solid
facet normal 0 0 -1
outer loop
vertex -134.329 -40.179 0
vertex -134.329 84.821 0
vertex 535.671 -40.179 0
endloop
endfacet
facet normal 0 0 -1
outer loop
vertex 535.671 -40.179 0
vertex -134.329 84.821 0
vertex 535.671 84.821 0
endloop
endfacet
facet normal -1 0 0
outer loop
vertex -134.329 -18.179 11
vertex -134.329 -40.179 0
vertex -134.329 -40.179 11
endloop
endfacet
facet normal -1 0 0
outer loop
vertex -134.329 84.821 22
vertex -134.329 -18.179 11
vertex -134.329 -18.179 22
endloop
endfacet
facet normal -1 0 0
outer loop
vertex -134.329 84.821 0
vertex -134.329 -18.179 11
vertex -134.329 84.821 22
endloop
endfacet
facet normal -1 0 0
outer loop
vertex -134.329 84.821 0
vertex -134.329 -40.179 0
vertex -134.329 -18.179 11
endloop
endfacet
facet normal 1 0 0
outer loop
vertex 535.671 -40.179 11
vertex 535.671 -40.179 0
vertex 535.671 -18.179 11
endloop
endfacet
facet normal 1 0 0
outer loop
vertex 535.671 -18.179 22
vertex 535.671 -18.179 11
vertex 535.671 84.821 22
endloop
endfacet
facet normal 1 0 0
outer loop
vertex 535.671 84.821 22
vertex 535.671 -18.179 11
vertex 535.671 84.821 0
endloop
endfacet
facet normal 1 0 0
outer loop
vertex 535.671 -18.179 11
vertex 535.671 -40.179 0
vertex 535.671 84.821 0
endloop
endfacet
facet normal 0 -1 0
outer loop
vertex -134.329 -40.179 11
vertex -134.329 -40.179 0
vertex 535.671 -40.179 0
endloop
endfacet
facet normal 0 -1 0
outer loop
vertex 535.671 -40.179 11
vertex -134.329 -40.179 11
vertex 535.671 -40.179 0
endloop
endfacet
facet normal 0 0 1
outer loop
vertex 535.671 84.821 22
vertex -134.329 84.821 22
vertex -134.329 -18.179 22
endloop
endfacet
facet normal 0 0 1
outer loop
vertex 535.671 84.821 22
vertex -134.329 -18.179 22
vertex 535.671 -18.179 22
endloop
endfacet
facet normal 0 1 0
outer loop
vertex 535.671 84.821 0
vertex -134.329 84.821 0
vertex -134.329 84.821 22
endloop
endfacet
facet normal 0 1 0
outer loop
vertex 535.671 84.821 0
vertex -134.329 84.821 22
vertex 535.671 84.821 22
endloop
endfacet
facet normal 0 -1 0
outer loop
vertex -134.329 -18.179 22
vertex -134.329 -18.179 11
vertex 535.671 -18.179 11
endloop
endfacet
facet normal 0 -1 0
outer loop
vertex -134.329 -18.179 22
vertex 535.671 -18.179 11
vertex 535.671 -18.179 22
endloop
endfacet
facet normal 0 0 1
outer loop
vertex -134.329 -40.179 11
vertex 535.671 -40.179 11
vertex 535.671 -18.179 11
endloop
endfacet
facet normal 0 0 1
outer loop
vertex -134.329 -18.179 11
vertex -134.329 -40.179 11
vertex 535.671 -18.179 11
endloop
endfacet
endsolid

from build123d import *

# Parameters (mm, degrees)
CROQUIS1_W              = 670
CROQUIS1_H              = 125
SALIENTE_EXTRUIR1_DEPTH = 22
CROQUIS2_W              = 11
CROQUIS2_H              = 22
CORTAR_EXTRUIR1_DEPTH   = 676.706056466


with BuildPart() as part:
    # Croquis1 → Saliente-Extruir1 (new body)
    with BuildSketch(Plane.XY):
        with Locations((200.670606996, 22.321428571)):
            Rectangle(CROQUIS1_W, CROQUIS1_H)
    extrude(amount=SALIENTE_EXTRUIR1_DEPTH)

    # Croquis2 → Cortar-Extruir1 (cut, through all)
    with BuildSketch(Plane.ZY.offset(134.329393004)):
        with Locations((16.5, -29.178571429)):
            Rectangle(CROQUIS2_W, CROQUIS2_H)
    extrude(amount=-CORTAR_EXTRUIR1_DEPTH, mode=Mode.SUBTRACT)


solid = part.part
